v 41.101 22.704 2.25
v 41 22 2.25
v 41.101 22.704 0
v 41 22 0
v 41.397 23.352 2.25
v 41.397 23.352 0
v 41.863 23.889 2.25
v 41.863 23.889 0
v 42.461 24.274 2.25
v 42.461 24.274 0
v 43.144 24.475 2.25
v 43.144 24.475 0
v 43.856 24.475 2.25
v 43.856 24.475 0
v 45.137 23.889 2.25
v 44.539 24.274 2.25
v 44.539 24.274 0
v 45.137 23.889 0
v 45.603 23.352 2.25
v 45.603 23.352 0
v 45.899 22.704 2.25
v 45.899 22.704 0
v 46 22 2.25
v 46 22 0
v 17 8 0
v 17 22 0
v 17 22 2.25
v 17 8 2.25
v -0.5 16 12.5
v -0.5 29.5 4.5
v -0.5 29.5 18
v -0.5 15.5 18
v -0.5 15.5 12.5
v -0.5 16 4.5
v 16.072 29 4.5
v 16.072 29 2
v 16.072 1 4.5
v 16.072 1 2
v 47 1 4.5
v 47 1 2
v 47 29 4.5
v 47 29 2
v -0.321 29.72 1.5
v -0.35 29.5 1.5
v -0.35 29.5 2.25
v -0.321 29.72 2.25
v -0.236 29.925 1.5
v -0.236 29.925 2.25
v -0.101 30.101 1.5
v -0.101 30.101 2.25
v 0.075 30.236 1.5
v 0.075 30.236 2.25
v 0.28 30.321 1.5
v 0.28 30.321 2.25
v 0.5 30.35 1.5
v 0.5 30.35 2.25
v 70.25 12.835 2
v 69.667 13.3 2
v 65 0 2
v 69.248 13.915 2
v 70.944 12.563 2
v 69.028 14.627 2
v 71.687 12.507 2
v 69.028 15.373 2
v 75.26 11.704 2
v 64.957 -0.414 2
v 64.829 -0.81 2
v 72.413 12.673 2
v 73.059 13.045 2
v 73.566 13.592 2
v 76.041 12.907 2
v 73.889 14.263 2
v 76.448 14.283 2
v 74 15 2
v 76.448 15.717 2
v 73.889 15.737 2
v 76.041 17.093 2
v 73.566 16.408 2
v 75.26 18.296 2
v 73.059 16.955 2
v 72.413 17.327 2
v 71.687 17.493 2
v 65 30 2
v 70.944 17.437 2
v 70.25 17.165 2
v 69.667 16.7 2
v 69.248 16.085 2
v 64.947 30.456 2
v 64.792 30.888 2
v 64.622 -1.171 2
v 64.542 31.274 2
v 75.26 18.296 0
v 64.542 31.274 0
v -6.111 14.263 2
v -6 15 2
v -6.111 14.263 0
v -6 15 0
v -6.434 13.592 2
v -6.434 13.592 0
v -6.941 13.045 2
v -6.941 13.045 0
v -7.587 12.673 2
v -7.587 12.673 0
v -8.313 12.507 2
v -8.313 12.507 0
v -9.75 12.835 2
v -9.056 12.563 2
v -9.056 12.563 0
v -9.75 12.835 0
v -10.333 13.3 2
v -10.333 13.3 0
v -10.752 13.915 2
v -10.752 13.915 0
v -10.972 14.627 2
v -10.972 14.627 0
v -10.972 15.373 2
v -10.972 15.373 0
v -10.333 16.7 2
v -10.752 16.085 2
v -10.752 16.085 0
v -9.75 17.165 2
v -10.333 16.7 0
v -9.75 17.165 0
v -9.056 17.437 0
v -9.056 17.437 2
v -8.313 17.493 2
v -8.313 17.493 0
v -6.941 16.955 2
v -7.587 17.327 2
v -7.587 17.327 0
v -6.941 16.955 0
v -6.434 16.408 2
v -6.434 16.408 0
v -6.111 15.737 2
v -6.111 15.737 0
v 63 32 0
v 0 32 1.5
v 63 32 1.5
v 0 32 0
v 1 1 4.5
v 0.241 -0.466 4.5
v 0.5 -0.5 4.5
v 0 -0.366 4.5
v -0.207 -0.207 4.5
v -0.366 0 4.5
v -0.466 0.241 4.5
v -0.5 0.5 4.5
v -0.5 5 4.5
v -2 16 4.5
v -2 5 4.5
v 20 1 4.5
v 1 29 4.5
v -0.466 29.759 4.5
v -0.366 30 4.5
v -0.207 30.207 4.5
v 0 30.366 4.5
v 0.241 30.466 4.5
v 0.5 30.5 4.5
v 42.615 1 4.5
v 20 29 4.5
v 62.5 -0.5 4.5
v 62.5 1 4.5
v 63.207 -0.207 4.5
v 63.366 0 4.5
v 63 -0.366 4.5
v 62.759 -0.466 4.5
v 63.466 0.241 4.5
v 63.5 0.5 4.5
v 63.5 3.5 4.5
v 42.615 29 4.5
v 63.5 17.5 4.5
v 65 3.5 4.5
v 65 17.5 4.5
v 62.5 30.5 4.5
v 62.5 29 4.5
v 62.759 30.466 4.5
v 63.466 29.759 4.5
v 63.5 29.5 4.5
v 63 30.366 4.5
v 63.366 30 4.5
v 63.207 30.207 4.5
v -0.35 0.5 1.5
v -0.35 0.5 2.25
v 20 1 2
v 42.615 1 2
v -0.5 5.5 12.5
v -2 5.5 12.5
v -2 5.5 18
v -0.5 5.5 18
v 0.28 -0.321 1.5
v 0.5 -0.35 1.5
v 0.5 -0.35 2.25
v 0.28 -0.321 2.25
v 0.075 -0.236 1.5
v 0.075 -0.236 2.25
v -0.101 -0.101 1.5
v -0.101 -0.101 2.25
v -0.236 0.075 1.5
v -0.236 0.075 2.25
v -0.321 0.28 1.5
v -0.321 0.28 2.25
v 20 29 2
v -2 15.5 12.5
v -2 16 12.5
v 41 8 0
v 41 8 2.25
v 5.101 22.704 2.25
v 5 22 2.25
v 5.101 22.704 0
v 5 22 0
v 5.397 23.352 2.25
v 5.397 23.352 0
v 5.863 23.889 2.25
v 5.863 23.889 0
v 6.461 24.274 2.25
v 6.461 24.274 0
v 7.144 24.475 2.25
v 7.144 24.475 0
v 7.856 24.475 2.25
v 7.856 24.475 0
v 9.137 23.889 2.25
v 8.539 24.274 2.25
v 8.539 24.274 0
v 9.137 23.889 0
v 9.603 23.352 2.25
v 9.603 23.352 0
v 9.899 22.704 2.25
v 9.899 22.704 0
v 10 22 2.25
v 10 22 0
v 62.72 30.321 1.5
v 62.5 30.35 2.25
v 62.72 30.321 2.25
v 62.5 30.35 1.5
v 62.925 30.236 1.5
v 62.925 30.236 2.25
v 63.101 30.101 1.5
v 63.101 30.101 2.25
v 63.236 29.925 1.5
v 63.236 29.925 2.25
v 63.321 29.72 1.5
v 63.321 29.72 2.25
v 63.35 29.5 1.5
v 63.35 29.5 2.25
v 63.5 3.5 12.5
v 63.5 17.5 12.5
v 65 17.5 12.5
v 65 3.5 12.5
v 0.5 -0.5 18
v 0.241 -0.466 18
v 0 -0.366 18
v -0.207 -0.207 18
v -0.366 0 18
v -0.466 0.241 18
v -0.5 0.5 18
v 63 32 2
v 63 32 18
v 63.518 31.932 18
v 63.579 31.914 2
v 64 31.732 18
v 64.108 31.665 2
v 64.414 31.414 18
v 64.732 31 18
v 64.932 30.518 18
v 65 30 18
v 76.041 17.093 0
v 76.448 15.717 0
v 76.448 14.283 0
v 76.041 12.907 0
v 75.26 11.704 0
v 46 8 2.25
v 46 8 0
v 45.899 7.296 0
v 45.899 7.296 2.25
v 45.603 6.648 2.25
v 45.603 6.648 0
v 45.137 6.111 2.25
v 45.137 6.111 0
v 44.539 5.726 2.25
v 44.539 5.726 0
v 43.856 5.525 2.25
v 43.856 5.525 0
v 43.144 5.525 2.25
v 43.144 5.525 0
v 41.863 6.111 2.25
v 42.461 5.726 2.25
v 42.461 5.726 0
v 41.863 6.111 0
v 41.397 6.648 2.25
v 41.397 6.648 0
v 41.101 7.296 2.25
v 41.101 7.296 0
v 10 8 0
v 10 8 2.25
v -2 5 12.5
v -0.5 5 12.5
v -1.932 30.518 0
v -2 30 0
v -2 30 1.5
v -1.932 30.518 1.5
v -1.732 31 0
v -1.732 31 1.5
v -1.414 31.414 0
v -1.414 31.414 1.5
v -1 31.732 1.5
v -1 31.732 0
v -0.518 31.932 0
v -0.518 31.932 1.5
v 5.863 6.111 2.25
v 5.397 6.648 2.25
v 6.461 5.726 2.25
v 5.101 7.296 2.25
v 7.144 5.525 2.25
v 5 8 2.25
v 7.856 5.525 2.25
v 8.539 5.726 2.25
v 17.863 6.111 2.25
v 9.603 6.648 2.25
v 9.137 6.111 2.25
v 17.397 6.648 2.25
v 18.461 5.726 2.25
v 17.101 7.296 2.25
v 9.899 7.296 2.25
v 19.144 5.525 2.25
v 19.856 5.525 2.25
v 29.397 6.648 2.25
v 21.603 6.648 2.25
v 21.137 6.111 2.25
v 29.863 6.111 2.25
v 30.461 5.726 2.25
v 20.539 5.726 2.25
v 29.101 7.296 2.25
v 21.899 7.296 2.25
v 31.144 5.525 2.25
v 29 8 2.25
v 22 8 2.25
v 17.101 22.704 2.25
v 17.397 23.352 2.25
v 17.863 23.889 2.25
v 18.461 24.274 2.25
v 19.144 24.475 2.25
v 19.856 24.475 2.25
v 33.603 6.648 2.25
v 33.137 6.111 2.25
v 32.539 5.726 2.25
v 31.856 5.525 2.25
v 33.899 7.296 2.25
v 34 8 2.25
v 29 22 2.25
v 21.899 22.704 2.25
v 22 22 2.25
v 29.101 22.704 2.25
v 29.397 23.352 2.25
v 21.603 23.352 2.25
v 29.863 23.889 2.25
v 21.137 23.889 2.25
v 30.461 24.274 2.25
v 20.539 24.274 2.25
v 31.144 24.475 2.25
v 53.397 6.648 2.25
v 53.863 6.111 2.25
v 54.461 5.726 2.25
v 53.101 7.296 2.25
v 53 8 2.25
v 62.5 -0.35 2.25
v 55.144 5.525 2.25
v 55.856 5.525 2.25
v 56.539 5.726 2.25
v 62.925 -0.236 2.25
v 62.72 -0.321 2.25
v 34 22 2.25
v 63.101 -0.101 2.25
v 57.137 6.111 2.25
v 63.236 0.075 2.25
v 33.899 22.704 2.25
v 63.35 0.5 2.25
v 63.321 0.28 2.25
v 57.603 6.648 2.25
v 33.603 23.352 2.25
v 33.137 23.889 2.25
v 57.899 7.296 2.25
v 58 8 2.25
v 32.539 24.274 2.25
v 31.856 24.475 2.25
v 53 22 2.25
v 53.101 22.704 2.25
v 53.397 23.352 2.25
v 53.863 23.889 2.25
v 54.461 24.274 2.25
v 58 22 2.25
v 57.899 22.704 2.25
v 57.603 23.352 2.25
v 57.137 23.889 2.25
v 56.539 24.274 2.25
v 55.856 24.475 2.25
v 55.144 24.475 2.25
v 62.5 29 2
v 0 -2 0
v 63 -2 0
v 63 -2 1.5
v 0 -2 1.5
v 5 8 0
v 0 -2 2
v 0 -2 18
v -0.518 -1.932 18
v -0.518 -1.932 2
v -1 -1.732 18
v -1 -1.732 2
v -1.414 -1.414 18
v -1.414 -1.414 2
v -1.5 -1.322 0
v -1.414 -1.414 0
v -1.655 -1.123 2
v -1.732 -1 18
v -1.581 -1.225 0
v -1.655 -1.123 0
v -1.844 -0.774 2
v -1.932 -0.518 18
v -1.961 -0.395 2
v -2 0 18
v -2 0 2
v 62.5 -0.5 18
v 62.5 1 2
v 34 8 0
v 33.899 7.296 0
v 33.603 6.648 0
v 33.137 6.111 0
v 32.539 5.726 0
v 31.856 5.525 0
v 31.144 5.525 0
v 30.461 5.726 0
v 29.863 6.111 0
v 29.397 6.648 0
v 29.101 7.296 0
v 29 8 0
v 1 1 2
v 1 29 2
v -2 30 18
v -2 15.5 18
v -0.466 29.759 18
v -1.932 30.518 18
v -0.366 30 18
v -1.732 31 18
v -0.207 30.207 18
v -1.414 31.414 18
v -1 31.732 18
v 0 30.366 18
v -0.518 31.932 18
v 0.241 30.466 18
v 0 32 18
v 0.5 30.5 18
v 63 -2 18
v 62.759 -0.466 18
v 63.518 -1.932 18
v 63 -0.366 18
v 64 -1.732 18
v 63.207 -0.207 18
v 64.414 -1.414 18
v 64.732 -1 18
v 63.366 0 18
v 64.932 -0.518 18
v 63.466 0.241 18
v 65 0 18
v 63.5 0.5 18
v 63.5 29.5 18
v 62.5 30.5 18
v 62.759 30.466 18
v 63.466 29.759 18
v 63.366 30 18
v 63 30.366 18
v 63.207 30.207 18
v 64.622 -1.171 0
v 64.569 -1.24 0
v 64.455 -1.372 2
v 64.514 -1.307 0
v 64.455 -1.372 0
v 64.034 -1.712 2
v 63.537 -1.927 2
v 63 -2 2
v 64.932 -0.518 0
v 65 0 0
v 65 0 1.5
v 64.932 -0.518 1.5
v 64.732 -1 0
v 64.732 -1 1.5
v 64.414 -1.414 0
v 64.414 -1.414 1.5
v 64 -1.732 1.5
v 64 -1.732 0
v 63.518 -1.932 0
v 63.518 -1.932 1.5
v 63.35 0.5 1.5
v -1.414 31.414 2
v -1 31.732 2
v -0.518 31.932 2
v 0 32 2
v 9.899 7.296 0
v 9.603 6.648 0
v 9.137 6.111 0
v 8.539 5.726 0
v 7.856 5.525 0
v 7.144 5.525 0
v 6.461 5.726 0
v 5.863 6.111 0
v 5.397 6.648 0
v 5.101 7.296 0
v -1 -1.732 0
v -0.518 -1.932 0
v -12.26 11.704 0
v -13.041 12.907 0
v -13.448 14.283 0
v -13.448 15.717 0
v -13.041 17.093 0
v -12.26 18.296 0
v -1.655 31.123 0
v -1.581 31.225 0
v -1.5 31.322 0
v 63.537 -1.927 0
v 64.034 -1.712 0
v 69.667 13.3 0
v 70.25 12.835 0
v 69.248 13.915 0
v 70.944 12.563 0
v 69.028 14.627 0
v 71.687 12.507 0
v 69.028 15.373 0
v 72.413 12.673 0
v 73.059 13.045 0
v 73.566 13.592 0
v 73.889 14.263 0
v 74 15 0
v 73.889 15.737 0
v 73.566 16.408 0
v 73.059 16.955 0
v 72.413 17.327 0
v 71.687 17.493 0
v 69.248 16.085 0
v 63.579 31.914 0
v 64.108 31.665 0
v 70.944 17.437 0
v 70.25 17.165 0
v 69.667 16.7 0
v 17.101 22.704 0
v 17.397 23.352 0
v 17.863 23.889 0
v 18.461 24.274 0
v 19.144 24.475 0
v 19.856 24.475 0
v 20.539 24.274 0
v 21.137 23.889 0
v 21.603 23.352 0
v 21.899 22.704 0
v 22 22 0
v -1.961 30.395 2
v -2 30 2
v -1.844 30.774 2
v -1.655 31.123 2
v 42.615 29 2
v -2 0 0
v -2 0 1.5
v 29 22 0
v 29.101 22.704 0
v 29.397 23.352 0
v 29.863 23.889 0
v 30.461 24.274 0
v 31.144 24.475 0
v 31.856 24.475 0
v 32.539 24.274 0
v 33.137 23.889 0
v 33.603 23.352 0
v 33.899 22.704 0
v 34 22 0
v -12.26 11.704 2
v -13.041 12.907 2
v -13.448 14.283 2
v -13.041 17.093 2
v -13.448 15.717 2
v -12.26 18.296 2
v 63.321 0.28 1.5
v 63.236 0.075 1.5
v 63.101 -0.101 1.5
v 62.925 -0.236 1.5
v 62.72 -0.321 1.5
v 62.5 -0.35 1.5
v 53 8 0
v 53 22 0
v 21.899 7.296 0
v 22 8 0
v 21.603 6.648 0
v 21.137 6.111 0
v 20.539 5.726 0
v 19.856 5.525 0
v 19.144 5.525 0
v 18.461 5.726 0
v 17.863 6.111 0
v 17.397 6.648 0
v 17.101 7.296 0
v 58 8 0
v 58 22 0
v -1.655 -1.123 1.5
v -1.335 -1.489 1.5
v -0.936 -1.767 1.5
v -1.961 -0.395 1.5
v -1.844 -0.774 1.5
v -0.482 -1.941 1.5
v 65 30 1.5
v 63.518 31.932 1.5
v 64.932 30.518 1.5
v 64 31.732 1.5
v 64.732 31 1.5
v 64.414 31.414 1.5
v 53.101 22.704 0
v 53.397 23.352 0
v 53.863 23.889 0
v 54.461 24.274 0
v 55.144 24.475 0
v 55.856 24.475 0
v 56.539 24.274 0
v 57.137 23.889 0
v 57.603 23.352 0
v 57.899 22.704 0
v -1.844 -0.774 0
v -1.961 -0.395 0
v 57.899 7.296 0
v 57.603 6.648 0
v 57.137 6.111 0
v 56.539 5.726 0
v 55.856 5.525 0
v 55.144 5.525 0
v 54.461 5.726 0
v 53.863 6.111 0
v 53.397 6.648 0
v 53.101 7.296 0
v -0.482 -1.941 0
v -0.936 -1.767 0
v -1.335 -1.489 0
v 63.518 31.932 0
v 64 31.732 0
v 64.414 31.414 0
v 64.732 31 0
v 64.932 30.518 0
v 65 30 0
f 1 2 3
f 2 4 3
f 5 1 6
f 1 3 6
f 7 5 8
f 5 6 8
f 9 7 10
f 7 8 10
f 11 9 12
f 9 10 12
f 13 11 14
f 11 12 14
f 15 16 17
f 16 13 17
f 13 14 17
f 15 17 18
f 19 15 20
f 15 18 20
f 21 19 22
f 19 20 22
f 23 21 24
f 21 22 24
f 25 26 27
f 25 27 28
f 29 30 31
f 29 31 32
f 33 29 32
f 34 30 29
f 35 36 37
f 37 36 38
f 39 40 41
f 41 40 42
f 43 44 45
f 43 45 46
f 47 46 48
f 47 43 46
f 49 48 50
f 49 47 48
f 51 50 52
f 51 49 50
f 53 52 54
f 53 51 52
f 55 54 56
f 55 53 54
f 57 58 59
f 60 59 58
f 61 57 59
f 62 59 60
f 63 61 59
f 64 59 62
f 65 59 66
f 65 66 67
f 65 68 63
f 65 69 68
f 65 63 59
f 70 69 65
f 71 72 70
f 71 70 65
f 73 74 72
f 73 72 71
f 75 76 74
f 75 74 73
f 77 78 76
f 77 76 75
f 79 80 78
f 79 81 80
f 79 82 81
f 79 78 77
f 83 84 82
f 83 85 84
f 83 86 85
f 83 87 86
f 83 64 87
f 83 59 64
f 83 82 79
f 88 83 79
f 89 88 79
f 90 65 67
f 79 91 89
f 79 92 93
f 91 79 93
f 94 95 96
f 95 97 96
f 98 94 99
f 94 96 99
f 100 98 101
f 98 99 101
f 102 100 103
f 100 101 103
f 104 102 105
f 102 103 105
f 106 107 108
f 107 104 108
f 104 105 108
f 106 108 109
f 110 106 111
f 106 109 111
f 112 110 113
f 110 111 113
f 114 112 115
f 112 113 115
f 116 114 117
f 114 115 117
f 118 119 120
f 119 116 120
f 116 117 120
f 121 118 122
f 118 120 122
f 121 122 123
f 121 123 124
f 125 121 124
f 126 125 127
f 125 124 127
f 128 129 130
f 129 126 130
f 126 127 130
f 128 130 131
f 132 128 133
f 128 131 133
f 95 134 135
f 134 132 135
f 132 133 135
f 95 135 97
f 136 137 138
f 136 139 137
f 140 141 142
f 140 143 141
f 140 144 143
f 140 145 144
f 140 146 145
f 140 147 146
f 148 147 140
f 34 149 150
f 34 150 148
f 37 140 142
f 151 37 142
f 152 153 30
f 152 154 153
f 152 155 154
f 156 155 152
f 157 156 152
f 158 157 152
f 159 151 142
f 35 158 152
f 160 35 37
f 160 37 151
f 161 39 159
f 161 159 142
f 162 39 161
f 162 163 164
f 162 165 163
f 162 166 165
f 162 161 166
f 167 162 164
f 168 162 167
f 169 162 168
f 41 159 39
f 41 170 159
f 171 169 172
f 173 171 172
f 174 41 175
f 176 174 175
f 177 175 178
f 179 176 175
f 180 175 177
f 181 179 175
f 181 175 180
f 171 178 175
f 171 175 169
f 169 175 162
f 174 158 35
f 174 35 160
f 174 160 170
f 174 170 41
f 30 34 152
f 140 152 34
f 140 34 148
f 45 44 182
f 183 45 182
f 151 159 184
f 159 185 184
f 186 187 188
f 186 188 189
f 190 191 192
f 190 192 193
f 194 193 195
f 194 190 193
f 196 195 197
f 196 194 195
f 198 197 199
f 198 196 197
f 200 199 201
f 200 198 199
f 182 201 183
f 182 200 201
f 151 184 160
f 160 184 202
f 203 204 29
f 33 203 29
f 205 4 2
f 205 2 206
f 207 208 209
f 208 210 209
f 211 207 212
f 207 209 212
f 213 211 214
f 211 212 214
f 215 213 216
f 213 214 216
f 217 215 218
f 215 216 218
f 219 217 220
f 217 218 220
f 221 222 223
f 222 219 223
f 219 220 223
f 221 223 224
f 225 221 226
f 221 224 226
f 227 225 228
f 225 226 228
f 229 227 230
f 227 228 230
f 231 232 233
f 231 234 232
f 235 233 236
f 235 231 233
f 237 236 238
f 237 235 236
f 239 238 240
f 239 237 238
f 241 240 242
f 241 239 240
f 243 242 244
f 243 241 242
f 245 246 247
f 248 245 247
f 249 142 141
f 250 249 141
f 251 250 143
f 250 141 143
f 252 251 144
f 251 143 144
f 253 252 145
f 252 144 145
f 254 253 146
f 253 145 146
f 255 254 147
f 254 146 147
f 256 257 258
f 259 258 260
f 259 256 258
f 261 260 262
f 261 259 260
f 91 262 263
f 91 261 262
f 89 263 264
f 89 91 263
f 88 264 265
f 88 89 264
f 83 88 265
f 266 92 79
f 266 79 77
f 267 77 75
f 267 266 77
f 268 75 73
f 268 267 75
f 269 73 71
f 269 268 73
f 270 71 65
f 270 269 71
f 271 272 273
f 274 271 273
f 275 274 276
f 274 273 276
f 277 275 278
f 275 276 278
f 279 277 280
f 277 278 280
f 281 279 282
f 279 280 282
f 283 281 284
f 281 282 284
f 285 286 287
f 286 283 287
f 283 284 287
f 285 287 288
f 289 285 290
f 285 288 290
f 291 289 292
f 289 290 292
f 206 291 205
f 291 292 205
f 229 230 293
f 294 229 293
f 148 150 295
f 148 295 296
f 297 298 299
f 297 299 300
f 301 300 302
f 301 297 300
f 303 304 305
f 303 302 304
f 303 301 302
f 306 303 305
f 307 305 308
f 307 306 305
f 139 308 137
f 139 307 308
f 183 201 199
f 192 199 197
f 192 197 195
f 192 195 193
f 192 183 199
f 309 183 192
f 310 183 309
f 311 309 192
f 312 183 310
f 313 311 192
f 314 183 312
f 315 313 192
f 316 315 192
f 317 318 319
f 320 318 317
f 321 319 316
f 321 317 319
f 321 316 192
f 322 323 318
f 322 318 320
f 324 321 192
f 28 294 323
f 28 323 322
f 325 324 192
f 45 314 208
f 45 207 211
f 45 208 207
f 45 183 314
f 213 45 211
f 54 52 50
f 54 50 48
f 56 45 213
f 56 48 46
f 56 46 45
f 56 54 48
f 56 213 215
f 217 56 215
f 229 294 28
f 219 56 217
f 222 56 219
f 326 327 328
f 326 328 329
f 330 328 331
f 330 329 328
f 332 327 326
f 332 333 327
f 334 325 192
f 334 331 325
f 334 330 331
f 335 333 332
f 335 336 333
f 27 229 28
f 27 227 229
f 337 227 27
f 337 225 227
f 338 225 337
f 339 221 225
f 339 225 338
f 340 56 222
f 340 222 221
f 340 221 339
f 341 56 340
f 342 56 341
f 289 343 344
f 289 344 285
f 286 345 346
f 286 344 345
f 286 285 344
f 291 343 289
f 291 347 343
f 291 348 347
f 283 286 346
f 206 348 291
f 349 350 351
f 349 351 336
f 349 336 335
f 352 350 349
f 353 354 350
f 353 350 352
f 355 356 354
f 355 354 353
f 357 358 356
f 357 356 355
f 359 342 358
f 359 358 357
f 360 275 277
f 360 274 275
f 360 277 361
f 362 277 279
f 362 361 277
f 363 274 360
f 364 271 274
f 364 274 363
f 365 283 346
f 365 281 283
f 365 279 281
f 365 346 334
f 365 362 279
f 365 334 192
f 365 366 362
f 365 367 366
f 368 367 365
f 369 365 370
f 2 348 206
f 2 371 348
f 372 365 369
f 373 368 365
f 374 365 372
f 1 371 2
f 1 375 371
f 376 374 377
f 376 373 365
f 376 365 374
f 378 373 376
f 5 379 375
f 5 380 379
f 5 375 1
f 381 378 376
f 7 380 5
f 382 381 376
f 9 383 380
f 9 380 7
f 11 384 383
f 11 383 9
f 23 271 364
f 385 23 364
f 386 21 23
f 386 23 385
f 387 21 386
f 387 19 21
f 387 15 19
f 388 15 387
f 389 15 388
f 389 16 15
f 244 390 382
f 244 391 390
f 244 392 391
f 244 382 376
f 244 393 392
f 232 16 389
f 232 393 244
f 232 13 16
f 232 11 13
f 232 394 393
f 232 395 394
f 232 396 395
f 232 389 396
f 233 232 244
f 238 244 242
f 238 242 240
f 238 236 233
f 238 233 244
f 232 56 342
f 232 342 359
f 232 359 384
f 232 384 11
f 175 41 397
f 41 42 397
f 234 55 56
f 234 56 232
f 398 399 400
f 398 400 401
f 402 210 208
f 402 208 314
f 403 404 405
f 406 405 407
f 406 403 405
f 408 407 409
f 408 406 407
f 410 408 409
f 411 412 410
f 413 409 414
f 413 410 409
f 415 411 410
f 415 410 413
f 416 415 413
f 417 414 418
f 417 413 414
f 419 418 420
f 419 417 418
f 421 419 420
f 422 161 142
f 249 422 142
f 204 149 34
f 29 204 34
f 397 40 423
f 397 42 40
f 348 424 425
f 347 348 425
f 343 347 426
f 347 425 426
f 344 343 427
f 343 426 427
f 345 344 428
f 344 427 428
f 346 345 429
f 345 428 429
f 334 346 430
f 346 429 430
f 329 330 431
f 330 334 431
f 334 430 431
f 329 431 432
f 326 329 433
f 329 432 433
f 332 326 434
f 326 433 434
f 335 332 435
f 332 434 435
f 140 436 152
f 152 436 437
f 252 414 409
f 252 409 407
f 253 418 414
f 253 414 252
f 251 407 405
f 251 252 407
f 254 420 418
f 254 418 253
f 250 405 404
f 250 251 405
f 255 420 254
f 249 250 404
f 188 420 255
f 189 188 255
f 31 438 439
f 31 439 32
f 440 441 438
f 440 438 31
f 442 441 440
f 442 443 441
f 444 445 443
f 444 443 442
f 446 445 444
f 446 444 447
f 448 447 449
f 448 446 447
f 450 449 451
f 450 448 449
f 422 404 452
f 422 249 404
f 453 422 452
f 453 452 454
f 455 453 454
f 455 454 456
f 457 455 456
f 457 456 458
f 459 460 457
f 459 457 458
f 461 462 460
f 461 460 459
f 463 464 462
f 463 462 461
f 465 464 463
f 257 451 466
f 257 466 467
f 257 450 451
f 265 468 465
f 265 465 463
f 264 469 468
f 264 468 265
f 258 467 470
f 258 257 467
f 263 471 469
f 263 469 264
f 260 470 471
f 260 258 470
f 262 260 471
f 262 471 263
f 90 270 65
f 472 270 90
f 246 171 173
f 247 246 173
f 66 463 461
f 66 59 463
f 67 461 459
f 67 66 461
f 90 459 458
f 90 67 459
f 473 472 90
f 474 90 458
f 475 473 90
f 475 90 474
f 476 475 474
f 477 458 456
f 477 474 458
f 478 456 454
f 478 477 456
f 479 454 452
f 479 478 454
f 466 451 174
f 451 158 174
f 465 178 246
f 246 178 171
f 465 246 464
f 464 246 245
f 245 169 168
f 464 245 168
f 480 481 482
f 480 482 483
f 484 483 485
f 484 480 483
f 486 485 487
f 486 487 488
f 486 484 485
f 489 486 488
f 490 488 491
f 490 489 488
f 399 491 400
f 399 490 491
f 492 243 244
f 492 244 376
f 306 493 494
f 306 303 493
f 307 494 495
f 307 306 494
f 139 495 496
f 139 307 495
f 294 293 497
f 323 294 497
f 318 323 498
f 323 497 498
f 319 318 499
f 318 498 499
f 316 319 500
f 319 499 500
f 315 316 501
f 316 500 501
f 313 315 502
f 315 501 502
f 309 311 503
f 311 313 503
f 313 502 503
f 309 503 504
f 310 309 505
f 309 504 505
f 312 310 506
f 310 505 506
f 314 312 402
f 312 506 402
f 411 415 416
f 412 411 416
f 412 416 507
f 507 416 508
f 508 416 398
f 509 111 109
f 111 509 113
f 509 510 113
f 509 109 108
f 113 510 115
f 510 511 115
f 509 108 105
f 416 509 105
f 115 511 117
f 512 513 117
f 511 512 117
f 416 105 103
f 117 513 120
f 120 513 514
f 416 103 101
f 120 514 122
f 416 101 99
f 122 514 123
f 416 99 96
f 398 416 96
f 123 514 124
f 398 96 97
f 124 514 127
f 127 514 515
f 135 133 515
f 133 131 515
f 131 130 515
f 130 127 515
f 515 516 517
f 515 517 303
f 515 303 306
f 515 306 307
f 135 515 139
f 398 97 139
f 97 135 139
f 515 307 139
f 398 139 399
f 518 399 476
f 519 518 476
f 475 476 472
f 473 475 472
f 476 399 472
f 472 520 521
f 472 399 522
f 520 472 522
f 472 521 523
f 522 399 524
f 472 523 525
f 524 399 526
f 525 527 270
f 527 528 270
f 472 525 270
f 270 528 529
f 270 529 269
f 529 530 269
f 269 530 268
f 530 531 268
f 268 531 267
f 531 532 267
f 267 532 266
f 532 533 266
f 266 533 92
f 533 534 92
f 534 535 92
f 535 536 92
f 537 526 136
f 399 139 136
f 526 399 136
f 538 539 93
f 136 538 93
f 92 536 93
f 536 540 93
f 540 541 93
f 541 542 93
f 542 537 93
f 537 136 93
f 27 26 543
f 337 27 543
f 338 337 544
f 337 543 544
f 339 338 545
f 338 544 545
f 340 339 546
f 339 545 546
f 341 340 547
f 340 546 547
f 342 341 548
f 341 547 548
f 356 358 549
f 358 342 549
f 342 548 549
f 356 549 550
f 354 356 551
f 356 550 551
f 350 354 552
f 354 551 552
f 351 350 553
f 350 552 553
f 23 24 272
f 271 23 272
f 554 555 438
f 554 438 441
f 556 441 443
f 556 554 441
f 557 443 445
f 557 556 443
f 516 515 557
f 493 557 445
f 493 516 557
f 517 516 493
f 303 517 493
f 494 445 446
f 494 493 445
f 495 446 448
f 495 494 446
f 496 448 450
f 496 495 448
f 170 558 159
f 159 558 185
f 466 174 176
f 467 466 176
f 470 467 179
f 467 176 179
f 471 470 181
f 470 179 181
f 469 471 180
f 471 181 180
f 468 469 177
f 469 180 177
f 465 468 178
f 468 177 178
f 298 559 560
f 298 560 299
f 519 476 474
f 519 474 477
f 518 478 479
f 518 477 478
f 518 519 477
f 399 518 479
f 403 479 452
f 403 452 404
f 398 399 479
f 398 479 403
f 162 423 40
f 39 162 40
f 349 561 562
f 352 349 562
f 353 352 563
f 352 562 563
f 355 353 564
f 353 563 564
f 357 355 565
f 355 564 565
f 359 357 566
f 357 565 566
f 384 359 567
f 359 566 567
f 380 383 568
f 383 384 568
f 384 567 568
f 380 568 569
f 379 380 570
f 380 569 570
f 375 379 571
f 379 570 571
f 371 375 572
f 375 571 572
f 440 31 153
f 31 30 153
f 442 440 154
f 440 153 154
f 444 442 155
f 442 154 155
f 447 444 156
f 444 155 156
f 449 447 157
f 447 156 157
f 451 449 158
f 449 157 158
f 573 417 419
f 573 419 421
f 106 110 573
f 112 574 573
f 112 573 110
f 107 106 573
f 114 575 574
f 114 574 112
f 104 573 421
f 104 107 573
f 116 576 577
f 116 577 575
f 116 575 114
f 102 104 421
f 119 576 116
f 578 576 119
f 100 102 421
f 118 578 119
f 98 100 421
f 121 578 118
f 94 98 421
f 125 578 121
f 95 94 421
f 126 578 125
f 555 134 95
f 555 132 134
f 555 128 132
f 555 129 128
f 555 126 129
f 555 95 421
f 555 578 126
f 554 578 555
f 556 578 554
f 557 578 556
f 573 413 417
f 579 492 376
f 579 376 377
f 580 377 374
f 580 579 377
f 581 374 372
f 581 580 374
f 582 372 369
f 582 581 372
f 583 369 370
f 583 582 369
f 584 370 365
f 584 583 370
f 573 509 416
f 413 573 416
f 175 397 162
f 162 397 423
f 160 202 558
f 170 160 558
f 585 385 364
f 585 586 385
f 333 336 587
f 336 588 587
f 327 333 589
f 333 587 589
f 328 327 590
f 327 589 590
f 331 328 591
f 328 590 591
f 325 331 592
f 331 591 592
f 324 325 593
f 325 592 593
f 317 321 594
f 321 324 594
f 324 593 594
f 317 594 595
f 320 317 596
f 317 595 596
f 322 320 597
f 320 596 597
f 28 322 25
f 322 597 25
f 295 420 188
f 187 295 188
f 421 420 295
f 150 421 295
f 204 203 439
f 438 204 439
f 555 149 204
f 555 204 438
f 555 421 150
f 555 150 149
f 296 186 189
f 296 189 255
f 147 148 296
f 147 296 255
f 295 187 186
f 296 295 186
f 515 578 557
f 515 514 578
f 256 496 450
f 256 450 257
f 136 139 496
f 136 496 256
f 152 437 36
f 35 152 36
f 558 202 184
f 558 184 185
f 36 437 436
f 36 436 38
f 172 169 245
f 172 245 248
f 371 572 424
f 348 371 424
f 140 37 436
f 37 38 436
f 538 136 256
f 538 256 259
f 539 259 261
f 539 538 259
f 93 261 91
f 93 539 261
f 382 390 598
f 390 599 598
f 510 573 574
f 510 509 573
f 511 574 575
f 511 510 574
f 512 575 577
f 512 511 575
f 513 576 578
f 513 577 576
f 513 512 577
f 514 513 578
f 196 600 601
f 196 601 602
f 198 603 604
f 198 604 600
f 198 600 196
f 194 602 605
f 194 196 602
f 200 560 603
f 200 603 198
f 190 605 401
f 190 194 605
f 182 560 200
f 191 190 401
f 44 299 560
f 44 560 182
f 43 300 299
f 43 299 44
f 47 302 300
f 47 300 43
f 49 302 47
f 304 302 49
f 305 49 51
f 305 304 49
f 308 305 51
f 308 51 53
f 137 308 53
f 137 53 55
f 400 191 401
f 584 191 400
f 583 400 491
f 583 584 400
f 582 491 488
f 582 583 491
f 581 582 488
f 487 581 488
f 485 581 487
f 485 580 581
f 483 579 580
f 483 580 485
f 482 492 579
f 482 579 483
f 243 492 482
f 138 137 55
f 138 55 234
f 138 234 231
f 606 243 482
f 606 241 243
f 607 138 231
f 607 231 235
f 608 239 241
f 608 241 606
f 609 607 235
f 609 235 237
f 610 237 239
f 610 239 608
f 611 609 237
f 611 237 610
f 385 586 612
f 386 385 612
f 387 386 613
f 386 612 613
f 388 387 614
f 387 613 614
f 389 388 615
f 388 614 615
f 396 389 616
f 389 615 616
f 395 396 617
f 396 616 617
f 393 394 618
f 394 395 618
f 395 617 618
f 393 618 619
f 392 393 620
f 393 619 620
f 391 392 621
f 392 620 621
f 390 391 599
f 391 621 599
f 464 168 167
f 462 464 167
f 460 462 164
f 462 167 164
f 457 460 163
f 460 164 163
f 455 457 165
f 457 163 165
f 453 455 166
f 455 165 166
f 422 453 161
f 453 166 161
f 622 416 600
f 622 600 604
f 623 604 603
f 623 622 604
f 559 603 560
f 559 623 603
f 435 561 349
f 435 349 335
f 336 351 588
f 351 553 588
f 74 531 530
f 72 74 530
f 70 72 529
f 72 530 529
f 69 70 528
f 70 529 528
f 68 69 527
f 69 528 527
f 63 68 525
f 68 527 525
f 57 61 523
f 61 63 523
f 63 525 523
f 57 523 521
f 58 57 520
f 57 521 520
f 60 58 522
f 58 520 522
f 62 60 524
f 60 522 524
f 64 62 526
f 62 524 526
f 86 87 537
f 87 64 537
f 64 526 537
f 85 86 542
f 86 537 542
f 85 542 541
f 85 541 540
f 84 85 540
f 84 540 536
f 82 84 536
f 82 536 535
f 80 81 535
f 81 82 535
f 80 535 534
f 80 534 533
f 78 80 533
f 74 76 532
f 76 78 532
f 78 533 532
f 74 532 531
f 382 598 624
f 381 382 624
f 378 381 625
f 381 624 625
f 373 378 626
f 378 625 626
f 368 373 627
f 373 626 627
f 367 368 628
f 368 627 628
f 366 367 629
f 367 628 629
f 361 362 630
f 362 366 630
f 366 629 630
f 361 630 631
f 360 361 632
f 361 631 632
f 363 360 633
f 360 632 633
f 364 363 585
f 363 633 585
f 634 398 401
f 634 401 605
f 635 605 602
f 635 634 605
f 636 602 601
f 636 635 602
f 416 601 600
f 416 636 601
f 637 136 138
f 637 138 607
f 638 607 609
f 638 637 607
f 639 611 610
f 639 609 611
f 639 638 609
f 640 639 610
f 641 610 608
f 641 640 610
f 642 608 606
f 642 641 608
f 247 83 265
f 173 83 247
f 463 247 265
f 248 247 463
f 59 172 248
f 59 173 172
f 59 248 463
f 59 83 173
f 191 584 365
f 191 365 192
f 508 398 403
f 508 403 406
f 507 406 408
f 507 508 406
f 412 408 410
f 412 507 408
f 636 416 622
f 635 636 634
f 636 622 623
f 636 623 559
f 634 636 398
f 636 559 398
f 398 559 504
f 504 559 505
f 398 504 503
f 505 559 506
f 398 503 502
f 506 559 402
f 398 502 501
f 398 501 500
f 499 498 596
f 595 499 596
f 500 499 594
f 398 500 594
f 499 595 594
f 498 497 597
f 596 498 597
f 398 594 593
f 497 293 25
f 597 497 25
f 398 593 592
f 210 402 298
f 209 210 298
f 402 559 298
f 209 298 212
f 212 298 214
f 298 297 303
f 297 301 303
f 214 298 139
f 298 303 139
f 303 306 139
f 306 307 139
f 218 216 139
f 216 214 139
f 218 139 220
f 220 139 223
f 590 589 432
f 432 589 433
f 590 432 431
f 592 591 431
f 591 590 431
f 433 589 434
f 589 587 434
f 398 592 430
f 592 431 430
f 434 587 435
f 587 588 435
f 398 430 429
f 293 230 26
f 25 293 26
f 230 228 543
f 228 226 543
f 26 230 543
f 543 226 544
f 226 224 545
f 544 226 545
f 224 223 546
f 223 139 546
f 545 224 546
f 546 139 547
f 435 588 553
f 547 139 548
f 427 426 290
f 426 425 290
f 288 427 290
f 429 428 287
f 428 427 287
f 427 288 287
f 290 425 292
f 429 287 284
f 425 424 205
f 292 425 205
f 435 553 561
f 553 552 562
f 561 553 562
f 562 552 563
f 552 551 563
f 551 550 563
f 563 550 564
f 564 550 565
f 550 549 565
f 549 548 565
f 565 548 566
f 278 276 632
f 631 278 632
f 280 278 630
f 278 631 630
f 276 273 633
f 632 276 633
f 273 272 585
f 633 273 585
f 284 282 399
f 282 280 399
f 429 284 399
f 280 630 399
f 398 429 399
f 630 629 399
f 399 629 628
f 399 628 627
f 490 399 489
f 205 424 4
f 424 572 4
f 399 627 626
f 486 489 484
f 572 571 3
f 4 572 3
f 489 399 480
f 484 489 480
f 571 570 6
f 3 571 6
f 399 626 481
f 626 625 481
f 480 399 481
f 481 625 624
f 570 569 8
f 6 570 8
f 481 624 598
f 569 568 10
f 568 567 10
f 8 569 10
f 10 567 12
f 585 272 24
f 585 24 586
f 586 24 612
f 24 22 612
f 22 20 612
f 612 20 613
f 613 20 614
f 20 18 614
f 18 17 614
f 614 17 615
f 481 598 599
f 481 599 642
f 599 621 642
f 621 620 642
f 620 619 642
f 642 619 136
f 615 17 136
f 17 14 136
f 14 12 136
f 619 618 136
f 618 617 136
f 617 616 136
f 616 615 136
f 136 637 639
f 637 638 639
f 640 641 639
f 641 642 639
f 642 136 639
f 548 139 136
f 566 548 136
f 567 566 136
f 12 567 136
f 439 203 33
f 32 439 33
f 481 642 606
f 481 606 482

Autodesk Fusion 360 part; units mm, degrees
sketch "Sketch1" plane through (0, 0, 0) normal (0, 0, 1) x (1, 0, 0) in component "card"
  line L0 (0, 0) -> (63, 0)
  line L1 (63, 0) -> (63, 30)
  line L2 (63, 30) -> (0, 30)
  line L3 (0, 30) -> (0, 0)
  line L4 (1, 29) -> (8.5, 29)
  line L5 (8.5, 29) -> (8.5, 19)
  line L6 (8.5, 19) -> (1, 19)
  line L7 (1, 19) -> (1, 29)
  line L8 (1, 6) -> (14.5, 6)
  line L9 (14.5, 6) -> (14.5, 15)
  line L10 (14.5, 15) -> (1, 15)
  line L11 (1, 15) -> (1, 6)
  line L12 (62, 29) -> (54.5, 29)
  line L13 (54.5, 29) -> (54.5, 19)
  line L14 (54.5, 19) -> (62, 19)
  line L15 (62, 19) -> (62, 29)
  line L16 (62, 4) -> (52, 4)
  line L17 (52, 4) -> (52, 17)
  line L18 (52, 17) -> (62, 17)
  line L19 (62, 17) -> (62, 4)
  dimension "d1" = 63
  dimension "d2" = 30
  dimension "d3" = 7.5
  dimension "d4" = 10
  dimension "d5" = 13.5
  dimension "d6" = 9
  dimension "d7" = 7.5
  dimension "d8" = 10
  dimension "d9" = 10
  dimension "d10" = 13
sketch "pcb support 0,4.5" plane through (0, 0, 0) normal (0, 0, 1) x (1, 0, 0) in component "bottom"
  line L0 (62.5, 29) -> (62.5, 1)
  line L1 (1, 1) -> (1, 29)
  line L2 (20, 1) -> (20, 29)
  line L3 (16.0721, 29) -> (16.0721, 1)
  line L4 (42.6148, 29) -> (42.6148, 1)
  line L5 (47, 1) -> (47, 29)
  line L6 (1, 29) -> (16.0721, 29)
  line L7 (20, 29) -> (42.6148, 29)
  line L8 (47, 29) -> (62.5, 29)
  line L9 (16.0721, 1) -> (1, 1)
  line L10 (62.5, 1) -> (47, 1)
  line L11 (42.6148, 1) -> (20, 1)
  line L12 (0, 32) -> (63, 32)
  line L13 (65, 30) -> (65, 0)
  line L14 (63, -2) -> (0, -2)
  line L15 (-2, 0) -> (-2, 30)
  arc A0 (0, 32) -> (-2, 30) centre (0, 30) ccw
  arc A1 (65, 30) -> (63, 32) centre (63, 30) ccw
  arc A2 (-2, 0) -> (0, -2) centre (0, 0) ccw
  arc A3 (63, -2) -> (65, 0) centre (63, 0) ccw
  dimension "d11" = 61.5
  dimension "d12" = 28
  dimension "d13" = 2
sketch "bottom 0,2.0" plane through (0, 0, 0) normal (0, 0, 1) x (1, 0, 0) in component "bottom"
  line L0 (0, 32) -> (63, 32)
  arc A0 (64.5421, 31.2736) -> (63, 32) centre (63, 30) ccw
  arc A1 (63, -2) -> (64.4554, -1.3718) centre (63, 0) ccw
  line L1 (63, -2) -> (0, -2)
  arc A2 (-1.6548, -1.1232) -> (0, -2) centre (0, 0) ccw
  arc A3 (0, 32) -> (-1.6548, 31.1232) centre (0, 30) ccw
  circle A4 centre (-8.5, 15) radius 2.5
  circle A5 centre (71.5, 15) radius 2.5
  arc A6 (-12.2599, 18.2959) -> (-12.2599, 11.7041) centre (-8.5, 15) ccw
  arc A7 (75.2599, 11.7041) -> (75.2599, 18.2959) centre (71.5, 15) ccw
  line L2 (-12.2599, 18.2959) -> (-1.4142, 31.4142)
  line L3 (-12.2599, 11.7041) -> (-1.4142, -1.4142)
  line L4 (75.2599, 18.2959) -> (64.5421, 31.2736)
  line L5 (75.2599, 11.7041) -> (64.4554, -1.3718)
  dimension "d14" = 2
  dimension "d15" = 5
  dimension "d17" = 5
  dimension "d19" = 10
  dimension "d20" = 10
sketch "lower wall 0,12.5" plane through (0, 0, 0) normal (0, 0, 1) x (1, 0, 0) in component "bottom"
  line L0 (0.5, 30.5) -> (62.5, 30.5)
  line L1 (62.5, -0.5) -> (0.5, -0.5)
  line L2 (0, 32) -> (63, 32)
  arc A0 (0, 32) -> (-2, 30) centre (0, 30) ccw
  arc A1 (-2, 0) -> (0, -2) centre (0, 0) ccw
  line L3 (63, -2) -> (0, -2)
  arc A2 (63, -2) -> (65, 0) centre (63, 0) ccw
  arc A3 (65, 30) -> (63, 32) centre (63, 30) ccw
  arc A4 (0.5, 30.5) -> (-0.5, 29.5) centre (0.5, 29.5) ccw
  arc A5 (-0.5, 0.5) -> (0.5, -0.5) centre (0.5, 0.5) ccw
  arc A6 (63.5, 29.5) -> (62.5, 30.5) centre (62.5, 29.5) ccw
  arc A7 (62.5, -0.5) -> (63.5, 0.5) centre (62.5, 0.5) ccw
  line L4 (-2, 5) -> (-0.5, 5)
  line L5 (-2, 16) -> (-0.5, 16)
  line L6 (63.5, 3.5) -> (65, 3.5)
  line L7 (63.5, 17.5) -> (65, 17.5)
  line L8 (63.5, 29.5) -> (63.5, 17.5)
  line L9 (63.5, 3.5) -> (63.5, 0.5)
  line L10 (65, 30) -> (65, 17.5)
  line L11 (65, 3.5) -> (65, 0)
  line L12 (-2, 0) -> (-2, 5)
  line L13 (-2, 16) -> (-2, 30)
  line L14 (-0.5, 0.5) -> (-0.5, 5)
  line L15 (-0.5, 16) -> (-0.5, 29.5)
  dimension "d21" = 2
  dimension "d22" = 1
  dimension "d23" = 1
  dimension "d24" = 1
  dimension "d25" = 1
sketch "upper wall 12.5/5.5" plane through (0, 0, 0) normal (0, 0, 1) x (1, 0, 0) in component "bottom"
  line L0 (-0.5, 16) -> (-0.5, 29.5)
  line L1 (-2, 0) -> (-2, 5)
  arc A0 (-0.5, 0.5) -> (0.5, -0.5) centre (0.5, 0.5) ccw
  line L2 (0.5, 30.5) -> (62.5, 30.5)
  line L3 (-0.5, 0.5) -> (-0.5, 5)
  line L4 (0, 32) -> (63, 32)
  arc A1 (0.5, 30.5) -> (-0.5, 29.5) centre (0.5, 29.5) ccw
  line L5 (-2, 16) -> (-2, 30)
  line L6 (62.5, -0.5) -> (0.5, -0.5)
  arc A2 (-2, 0) -> (0, -2) centre (0, 0) ccw
  arc A3 (0, 32) -> (-2, 30) centre (0, 30) ccw
  line L7 (63, -2) -> (0, -2)
  arc A4 (65, 30) -> (63, 32) centre (63, 30) ccw
  line L8 (65, 3.5) -> (65, 0)
  line L9 (63.5, 3.5) -> (63.5, 0.5)
  arc A5 (63, -2) -> (65, 0) centre (63, 0) ccw
  line L10 (63.5, 29.5) -> (63.5, 17.5)
  line L11 (65, 30) -> (65, 17.5)
  arc A6 (62.5, -0.5) -> (63.5, 0.5) centre (62.5, 0.5) ccw
  arc A7 (63.5, 29.5) -> (62.5, 30.5) centre (62.5, 29.5) ccw
  line L12 (63.5, 17.5) -> (63.5, 3.5)
  line L13 (65, 17.5) -> (65, 3.5)
  line L14 (-2, 15.5) -> (-0.5, 15.5)
  line L15 (-2, 5.5) -> (-0.5, 5.5)
  line L16 (-2, 5) -> (-2, 5.5)
  line L17 (-2, 15.5) -> (-2, 16)
  line L18 (-0.5, 16) -> (-0.5, 15.5)
  line L19 (-0.5, 5.5) -> (-0.5, 5)
extrude "Extrude1" add sketch "bottom 0,2.0" along normal blind 2 contours L0 A0 A1 L1 A2 A3 A6 A7 L2 L3 L4 L5 makes body 1
extrude "Extrude2" add sketch "pcb support 0,4.5" along normal blind 4.5 bodies 1
extrude "Extrude3" add sketch "lower wall 0,12.5" along normal blind 12.5 bodies 1
extrude "Extrude4" add sketch "upper wall 12.5/5.5" along normal blind 5.5 from surface at 12.5 bodies 1
sketch "top 0,1.5" plane through (0, 0, 0) normal (0, 0, 1) x (1, 0, 0) in component "top"
  line L0 (63, -2) -> (0, -2)
  line L1 (0, 32) -> (63, 32)
  line L2 (0, 32) -> (63, 32)
  line L3 (0, 32) -> (63, 32)
  line L4 (63, -2) -> (0, -2)
  line L5 (65, 30) -> (65, 17.5)
  line L6 (63, -2) -> (0, -2)
  line L7 (65, 30) -> (65, 0)
  arc A0 (63, -2) -> (65, 0) centre (63, 0) ccw
  line L8 (63, -2) -> (0, -2)
  arc A1 (63, -2) -> (65, 0) centre (63, 0) ccw
  arc A2 (65, 30) -> (63, 32) centre (63, 30) ccw
  arc A3 (63, -2) -> (64.4554, -1.3718) centre (63, 0) ccw
  arc A4 (65, 30) -> (63, 32) centre (63, 30) ccw
  arc A5 (0, 32) -> (-2, 30) centre (0, 30) ccw
  arc A6 (63, -2) -> (65, 0) centre (63, 0) ccw
  line L9 (0, 32) -> (63, 32)
  line L10 (65, 3.5) -> (65, 0)
  line L11 (65, 30) -> (65, 17.5)
  arc A7 (-1.6548, -1.1232) -> (0, -2) centre (0, 0) ccw
  arc A8 (64.5421, 31.2736) -> (63, 32) centre (63, 30) ccw
  line L12 (65, 3.5) -> (65, 0)
  arc A9 (65, 30) -> (63, 32) centre (63, 30) ccw
  line L13 (-2, 16) -> (-2, 30)
  arc A10 (-2, 0) -> (0, -2) centre (0, 0) ccw
  line L14 (-2, 16) -> (-2, 30)
  arc A11 (0, 32) -> (-1.6548, 31.1232) centre (0, 30) ccw
  line L15 (-2, 0) -> (-2, 30)
  arc A12 (0, 32) -> (-2, 30) centre (0, 30) ccw
  arc A13 (0, 32) -> (-2, 30) centre (0, 30) ccw
  arc A14 (-2, 0) -> (0, -2) centre (0, 0) ccw
  arc A15 (-2, 0) -> (0, -2) centre (0, 0) ccw
  line L16 (-2, 16) -> (-2, 5)
  line L17 (5, 22) -> (5, 8)
  line L18 (10, 22) -> (10, 8)
  arc A16 (10, 22) -> (5, 22) centre (7.5, 22) ccw
  arc A17 (5, 8) -> (10, 8) centre (7.5, 8) ccw
  line L19 (22, 22) -> (22, 8)
  arc A18 (22, 22) -> (17, 22) centre (19.5, 22) ccw
  arc A19 (17, 8) -> (22, 8) centre (19.5, 8) ccw
  line L20 (17, 22) -> (17, 8)
  line L21 (34, 22) -> (34, 8)
  arc A20 (34, 22) -> (29, 22) centre (31.5, 22) ccw
  arc A21 (29, 8) -> (34, 8) centre (31.5, 8) ccw
  line L22 (29, 22) -> (29, 8)
  line L23 (46, 22) -> (46, 8)
  arc A22 (46, 22) -> (41, 22) centre (43.5, 22) ccw
  arc A23 (41, 8) -> (46, 8) centre (43.5, 8) ccw
  line L24 (41, 22) -> (41, 8)
  line L25 (58, 22) -> (58, 8)
  arc A24 (58, 22) -> (53, 22) centre (55.5, 22) ccw
  arc A25 (53, 8) -> (58, 8) centre (55.5, 8) ccw
  line L26 (53, 22) -> (53, 8)
  point P0 (-1.4142, 31.4142)
  point P1 (-1.4142, -1.4142)
  dimension "d60" = 2
  dimension "d77" = 48
  dimension "d78" = 0
sketch "lip 0,2.25" plane through (0, 0, 0) normal (0, 0, 1) x (1, 0, 0) in component "top"
  arc A0 (62.5, -0.35) -> (63.35, 0.5) centre (62.5, 0.5) ccw
  arc A1 (63.35, 29.5) -> (62.5, 30.35) centre (62.5, 29.5) ccw
  arc A2 (63.35, 29.5) -> (62.5, 30.35) centre (62.5, 29.5) ccw
  line L0 (63.35, 29.5) -> (63.35, 0.5)
  line L1 (63.35, 29.5) -> (63.35, 0.5)
  arc A3 (62.5, -0.35) -> (63.35, 0.5) centre (62.5, 0.5) ccw
  arc A4 (63.35, 29.5) -> (62.5, 30.35) centre (62.5, 29.5) ccw
  arc A5 (0.5, 30.35) -> (-0.35, 29.5) centre (0.5, 29.5) ccw
  line L2 (-0.35, 29.5) -> (-0.35, 0.5)
  line L3 (62.5, -0.35) -> (0.5, -0.35)
  line L4 (-0.35, 29.5) -> (-0.35, 0.5)
  arc A6 (-0.35, 0.5) -> (0.5, -0.35) centre (0.5, 0.5) ccw
  line L5 (0.5, 30.35) -> (62.5, 30.35)
  line L6 (62.5, -0.35) -> (0.5, -0.35)
  arc A7 (0.5, 30.35) -> (-0.35, 29.5) centre (0.5, 29.5) ccw
  line L7 (5, 22) -> (5, 8)
  arc A8 (29, 8) -> (34, 8) centre (31.5, 8) ccw
  line L8 (10, 22) -> (10, 8)
  arc A9 (34, 22) -> (29, 22) centre (31.5, 22) ccw
  arc A10 (10, 22) -> (5, 22) centre (7.5, 22) ccw
  line L9 (22, 22) -> (22, 8)
  line L10 (41, 22) -> (41, 8)
  arc A11 (46, 22) -> (41, 22) centre (43.5, 22) ccw
  arc A12 (5, 8) -> (10, 8) centre (7.5, 8) ccw
  line L11 (17, 22) -> (17, 8)
  arc A13 (58, 22) -> (53, 22) centre (55.5, 22) ccw
  arc A14 (22, 22) -> (17, 22) centre (19.5, 22) ccw
  arc A15 (17, 8) -> (22, 8) centre (19.5, 8) ccw
  line L12 (29, 22) -> (29, 8)
  arc A16 (41, 8) -> (46, 8) centre (43.5, 8) ccw
  arc A17 (53, 8) -> (58, 8) centre (55.5, 8) ccw
  line L13 (58, 22) -> (58, 8)
  line L14 (34, 22) -> (34, 8)
  line L15 (53, 22) -> (53, 8)
  line L16 (46, 22) -> (46, 8)
  point P0 (-1.4142, 31.4142)
  dimension "d81" = 48
  dimension "d82" = 0
extrude "Extrude1'" add sketch "top 0,1.5" along normal blind 1.5 separate body makes body 2 in component "top"
extrude "Extrude2'" add sketch "lip 0,2.25" along normal blind 2.25 bodies 2 in component "top"
component "card" placed x (1, 0, 0) y (0, 1, 0) z (0, 0, 1) at (0, 0, 0)
component "bottom" placed x (1, 0, 0) y (0, 1, 0) z (0, 0, 1) at (0, 0, 0)
component "top" placed x (1, 0, 0) y (0, 1, 0) z (0, 0, 1) at (0, 0, 0)
